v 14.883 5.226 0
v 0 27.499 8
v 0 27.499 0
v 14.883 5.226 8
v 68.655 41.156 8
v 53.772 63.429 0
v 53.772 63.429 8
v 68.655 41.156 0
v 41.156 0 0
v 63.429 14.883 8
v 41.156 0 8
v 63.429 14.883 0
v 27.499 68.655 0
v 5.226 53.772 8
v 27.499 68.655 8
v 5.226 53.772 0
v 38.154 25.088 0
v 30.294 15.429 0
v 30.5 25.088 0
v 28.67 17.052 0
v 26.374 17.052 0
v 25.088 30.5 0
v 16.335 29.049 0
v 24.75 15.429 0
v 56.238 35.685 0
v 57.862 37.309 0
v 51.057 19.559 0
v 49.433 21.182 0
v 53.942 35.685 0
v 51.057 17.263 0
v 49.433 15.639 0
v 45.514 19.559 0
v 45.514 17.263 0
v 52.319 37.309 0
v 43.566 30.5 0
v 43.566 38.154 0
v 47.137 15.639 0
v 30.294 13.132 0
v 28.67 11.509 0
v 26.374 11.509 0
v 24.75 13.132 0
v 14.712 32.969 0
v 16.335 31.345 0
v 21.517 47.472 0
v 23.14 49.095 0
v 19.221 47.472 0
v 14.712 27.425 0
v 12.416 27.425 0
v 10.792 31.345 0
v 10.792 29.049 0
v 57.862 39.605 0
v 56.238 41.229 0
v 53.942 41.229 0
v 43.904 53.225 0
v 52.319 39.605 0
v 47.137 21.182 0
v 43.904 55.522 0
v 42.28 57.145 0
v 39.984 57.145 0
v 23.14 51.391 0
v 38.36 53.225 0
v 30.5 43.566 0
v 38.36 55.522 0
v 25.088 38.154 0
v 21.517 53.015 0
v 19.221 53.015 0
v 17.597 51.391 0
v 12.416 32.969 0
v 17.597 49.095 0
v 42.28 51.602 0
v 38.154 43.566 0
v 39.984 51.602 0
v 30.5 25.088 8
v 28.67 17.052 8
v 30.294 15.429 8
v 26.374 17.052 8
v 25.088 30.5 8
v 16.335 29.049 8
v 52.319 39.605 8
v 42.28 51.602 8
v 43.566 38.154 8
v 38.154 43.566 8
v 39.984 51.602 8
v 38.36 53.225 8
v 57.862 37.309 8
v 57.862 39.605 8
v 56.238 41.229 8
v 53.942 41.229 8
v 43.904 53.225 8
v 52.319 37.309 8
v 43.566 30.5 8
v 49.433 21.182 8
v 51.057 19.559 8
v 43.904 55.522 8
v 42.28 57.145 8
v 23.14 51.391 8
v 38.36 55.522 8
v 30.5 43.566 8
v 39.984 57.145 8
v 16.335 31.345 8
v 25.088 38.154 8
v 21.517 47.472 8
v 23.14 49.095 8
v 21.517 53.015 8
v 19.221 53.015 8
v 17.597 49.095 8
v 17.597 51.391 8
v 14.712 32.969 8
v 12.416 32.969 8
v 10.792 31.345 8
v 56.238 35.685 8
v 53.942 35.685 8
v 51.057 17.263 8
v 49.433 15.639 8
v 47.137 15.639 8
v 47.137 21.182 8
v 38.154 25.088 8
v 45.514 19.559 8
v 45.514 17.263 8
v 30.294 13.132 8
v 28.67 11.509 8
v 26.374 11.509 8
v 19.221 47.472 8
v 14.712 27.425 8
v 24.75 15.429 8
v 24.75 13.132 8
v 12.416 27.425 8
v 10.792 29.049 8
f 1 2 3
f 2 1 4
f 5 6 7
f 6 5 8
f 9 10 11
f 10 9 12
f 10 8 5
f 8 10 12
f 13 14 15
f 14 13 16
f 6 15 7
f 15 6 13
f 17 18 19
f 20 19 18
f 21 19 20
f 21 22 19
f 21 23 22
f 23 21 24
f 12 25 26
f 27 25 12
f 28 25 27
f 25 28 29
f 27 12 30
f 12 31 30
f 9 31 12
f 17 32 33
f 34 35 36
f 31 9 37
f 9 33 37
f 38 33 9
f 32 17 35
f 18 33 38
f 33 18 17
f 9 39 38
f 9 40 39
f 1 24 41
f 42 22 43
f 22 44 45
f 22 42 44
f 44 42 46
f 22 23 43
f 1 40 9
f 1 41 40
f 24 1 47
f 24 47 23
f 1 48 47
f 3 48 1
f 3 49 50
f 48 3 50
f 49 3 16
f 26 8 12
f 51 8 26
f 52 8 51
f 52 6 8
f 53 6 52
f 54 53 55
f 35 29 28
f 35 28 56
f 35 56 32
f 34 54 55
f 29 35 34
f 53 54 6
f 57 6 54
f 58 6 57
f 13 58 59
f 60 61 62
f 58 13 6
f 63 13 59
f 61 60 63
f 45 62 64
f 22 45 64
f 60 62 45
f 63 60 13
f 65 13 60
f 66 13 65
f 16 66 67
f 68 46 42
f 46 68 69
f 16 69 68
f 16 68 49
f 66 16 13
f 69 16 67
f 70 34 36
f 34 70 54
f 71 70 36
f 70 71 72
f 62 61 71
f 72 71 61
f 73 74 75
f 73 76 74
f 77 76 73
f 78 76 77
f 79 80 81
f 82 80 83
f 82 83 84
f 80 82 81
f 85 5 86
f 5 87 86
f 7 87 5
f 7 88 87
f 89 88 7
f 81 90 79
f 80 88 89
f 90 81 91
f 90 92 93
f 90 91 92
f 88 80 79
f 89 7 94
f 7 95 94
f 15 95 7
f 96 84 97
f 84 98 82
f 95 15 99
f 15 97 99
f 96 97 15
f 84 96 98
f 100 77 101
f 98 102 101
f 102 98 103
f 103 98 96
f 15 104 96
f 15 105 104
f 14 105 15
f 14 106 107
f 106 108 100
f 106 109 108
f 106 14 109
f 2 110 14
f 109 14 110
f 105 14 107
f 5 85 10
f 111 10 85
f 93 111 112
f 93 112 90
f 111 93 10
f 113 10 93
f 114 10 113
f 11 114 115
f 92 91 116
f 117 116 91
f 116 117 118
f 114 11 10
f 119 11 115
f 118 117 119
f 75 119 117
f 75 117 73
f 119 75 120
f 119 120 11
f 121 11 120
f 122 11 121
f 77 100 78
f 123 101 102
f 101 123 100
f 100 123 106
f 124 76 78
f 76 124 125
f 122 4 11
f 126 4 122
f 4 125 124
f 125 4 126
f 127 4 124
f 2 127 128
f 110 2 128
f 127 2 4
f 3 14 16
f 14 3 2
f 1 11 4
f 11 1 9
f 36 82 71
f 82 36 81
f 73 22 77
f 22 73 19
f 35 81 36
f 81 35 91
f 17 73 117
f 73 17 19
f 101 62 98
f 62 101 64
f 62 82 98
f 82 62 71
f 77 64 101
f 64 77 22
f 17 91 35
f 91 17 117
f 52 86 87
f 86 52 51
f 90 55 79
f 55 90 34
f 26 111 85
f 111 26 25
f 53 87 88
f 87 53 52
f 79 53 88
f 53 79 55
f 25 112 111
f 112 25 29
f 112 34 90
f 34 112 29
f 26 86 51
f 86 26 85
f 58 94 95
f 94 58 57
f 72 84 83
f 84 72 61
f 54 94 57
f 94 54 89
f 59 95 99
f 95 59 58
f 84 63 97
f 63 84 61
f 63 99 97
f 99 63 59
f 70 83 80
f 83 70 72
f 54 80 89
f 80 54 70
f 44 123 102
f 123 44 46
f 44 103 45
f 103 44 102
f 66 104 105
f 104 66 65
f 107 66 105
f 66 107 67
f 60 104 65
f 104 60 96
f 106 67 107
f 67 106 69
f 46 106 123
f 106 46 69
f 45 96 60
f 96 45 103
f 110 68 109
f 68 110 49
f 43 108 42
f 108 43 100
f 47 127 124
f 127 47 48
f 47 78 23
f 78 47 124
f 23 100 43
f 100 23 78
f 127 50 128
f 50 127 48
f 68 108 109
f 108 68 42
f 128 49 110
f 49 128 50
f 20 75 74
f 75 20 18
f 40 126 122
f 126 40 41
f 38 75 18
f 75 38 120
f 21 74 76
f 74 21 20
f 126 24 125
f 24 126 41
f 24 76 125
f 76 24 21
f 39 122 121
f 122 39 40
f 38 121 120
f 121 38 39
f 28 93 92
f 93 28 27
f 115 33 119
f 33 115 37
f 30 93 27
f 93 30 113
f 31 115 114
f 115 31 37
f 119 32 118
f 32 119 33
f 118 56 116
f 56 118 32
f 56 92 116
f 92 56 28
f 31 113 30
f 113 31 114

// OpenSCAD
$fn = 32;

// ----------------------------------------------------------------------
// Polygon plate: 8-gon R35, 6 bolt windows
// ----------------------------------------------------------------------

// --- parameters (mm) ---
sides = 8;                // number of polygon sides
plate_r = 35;             // circumscribed radius of the polygon
bore_r = 10;              // centre bore radius
bolts = 6;                // number of bolt windows
ring_r = 21.17;           // bolt-circle radius
bolt_r = 3;               // bolt window radius
plate_t = 8;              // plate thickness, Z (extrusion height)

plate_d = 2 * plate_r;  // circumscribed diameter
bore_d = 2 * bore_r;  // centre bore diameter
bolt_d = 2 * bolt_r;  // bolt window diameter
ring_d = 2 * ring_r;  // bolt-circle diameter

profile = [[68.655, 41.156], [53.772, 63.429], [27.499, 68.655], [5.226, 53.772], [0, 27.499], [14.883, 5.226], [41.156, 0], [63.429, 14.883]];  // primary outline, 8 points, counter clockwise
void_1 = [[43.566, 38.154], [38.154, 43.566], [30.5, 43.566], [25.088, 38.154], [25.088, 30.5], [30.5, 25.088], [38.154, 25.088], [43.566, 30.5]];  // centre bore, 8 points
void_2 = [[57.862, 39.605], [56.238, 41.229], [53.942, 41.229], [52.319, 39.605], [52.319, 37.309], [53.942, 35.685], [56.238, 35.685], [57.862, 37.309]];  // bolt window 1, 8 points
void_3 = [[43.904, 55.522], [42.28, 57.145], [39.984, 57.145], [38.36, 55.522], [38.36, 53.225], [39.984, 51.602], [42.28, 51.602], [43.904, 53.225]];  // bolt window 2, 8 points
void_4 = [[23.14, 51.391], [21.517, 53.015], [19.221, 53.015], [17.597, 51.391], [17.597, 49.095], [19.221, 47.472], [21.517, 47.472], [23.14, 49.095]];  // bolt window 3, 8 points
void_5 = [[16.335, 31.345], [14.712, 32.969], [12.416, 32.969], [10.792, 31.345], [10.792, 29.049], [12.416, 27.425], [14.712, 27.425], [16.335, 29.049]];  // bolt window 4, 8 points
void_6 = [[30.294, 15.429], [28.67, 17.052], [26.374, 17.052], [24.75, 15.429], [24.75, 13.132], [26.374, 11.509], [28.67, 11.509], [30.294, 13.132]];  // bolt window 5, 8 points
void_7 = [[51.057, 19.559], [49.433, 21.182], [47.137, 21.182], [45.514, 19.559], [45.514, 17.263], [47.137, 15.639], [49.433, 15.639], [51.057, 17.263]];  // bolt window 6, 8 points

// --- the one profile operation ---
difference() {
  linear_extrude(height = plate_t) polygon(points = profile);
  translate([0, 0, -1])
    linear_extrude(height = plate_t + 2) polygon(points = void_1);
  translate([0, 0, -1])
    linear_extrude(height = plate_t + 2) polygon(points = void_2);
  translate([0, 0, -1])
    linear_extrude(height = plate_t + 2) polygon(points = void_3);
  translate([0, 0, -1])
    linear_extrude(height = plate_t + 2) polygon(points = void_4);
  translate([0, 0, -1])
    linear_extrude(height = plate_t + 2) polygon(points = void_5);
  translate([0, 0, -1])
    linear_extrude(height = plate_t + 2) polygon(points = void_6);
  translate([0, 0, -1])
    linear_extrude(height = plate_t + 2) polygon(points = void_7);
}
